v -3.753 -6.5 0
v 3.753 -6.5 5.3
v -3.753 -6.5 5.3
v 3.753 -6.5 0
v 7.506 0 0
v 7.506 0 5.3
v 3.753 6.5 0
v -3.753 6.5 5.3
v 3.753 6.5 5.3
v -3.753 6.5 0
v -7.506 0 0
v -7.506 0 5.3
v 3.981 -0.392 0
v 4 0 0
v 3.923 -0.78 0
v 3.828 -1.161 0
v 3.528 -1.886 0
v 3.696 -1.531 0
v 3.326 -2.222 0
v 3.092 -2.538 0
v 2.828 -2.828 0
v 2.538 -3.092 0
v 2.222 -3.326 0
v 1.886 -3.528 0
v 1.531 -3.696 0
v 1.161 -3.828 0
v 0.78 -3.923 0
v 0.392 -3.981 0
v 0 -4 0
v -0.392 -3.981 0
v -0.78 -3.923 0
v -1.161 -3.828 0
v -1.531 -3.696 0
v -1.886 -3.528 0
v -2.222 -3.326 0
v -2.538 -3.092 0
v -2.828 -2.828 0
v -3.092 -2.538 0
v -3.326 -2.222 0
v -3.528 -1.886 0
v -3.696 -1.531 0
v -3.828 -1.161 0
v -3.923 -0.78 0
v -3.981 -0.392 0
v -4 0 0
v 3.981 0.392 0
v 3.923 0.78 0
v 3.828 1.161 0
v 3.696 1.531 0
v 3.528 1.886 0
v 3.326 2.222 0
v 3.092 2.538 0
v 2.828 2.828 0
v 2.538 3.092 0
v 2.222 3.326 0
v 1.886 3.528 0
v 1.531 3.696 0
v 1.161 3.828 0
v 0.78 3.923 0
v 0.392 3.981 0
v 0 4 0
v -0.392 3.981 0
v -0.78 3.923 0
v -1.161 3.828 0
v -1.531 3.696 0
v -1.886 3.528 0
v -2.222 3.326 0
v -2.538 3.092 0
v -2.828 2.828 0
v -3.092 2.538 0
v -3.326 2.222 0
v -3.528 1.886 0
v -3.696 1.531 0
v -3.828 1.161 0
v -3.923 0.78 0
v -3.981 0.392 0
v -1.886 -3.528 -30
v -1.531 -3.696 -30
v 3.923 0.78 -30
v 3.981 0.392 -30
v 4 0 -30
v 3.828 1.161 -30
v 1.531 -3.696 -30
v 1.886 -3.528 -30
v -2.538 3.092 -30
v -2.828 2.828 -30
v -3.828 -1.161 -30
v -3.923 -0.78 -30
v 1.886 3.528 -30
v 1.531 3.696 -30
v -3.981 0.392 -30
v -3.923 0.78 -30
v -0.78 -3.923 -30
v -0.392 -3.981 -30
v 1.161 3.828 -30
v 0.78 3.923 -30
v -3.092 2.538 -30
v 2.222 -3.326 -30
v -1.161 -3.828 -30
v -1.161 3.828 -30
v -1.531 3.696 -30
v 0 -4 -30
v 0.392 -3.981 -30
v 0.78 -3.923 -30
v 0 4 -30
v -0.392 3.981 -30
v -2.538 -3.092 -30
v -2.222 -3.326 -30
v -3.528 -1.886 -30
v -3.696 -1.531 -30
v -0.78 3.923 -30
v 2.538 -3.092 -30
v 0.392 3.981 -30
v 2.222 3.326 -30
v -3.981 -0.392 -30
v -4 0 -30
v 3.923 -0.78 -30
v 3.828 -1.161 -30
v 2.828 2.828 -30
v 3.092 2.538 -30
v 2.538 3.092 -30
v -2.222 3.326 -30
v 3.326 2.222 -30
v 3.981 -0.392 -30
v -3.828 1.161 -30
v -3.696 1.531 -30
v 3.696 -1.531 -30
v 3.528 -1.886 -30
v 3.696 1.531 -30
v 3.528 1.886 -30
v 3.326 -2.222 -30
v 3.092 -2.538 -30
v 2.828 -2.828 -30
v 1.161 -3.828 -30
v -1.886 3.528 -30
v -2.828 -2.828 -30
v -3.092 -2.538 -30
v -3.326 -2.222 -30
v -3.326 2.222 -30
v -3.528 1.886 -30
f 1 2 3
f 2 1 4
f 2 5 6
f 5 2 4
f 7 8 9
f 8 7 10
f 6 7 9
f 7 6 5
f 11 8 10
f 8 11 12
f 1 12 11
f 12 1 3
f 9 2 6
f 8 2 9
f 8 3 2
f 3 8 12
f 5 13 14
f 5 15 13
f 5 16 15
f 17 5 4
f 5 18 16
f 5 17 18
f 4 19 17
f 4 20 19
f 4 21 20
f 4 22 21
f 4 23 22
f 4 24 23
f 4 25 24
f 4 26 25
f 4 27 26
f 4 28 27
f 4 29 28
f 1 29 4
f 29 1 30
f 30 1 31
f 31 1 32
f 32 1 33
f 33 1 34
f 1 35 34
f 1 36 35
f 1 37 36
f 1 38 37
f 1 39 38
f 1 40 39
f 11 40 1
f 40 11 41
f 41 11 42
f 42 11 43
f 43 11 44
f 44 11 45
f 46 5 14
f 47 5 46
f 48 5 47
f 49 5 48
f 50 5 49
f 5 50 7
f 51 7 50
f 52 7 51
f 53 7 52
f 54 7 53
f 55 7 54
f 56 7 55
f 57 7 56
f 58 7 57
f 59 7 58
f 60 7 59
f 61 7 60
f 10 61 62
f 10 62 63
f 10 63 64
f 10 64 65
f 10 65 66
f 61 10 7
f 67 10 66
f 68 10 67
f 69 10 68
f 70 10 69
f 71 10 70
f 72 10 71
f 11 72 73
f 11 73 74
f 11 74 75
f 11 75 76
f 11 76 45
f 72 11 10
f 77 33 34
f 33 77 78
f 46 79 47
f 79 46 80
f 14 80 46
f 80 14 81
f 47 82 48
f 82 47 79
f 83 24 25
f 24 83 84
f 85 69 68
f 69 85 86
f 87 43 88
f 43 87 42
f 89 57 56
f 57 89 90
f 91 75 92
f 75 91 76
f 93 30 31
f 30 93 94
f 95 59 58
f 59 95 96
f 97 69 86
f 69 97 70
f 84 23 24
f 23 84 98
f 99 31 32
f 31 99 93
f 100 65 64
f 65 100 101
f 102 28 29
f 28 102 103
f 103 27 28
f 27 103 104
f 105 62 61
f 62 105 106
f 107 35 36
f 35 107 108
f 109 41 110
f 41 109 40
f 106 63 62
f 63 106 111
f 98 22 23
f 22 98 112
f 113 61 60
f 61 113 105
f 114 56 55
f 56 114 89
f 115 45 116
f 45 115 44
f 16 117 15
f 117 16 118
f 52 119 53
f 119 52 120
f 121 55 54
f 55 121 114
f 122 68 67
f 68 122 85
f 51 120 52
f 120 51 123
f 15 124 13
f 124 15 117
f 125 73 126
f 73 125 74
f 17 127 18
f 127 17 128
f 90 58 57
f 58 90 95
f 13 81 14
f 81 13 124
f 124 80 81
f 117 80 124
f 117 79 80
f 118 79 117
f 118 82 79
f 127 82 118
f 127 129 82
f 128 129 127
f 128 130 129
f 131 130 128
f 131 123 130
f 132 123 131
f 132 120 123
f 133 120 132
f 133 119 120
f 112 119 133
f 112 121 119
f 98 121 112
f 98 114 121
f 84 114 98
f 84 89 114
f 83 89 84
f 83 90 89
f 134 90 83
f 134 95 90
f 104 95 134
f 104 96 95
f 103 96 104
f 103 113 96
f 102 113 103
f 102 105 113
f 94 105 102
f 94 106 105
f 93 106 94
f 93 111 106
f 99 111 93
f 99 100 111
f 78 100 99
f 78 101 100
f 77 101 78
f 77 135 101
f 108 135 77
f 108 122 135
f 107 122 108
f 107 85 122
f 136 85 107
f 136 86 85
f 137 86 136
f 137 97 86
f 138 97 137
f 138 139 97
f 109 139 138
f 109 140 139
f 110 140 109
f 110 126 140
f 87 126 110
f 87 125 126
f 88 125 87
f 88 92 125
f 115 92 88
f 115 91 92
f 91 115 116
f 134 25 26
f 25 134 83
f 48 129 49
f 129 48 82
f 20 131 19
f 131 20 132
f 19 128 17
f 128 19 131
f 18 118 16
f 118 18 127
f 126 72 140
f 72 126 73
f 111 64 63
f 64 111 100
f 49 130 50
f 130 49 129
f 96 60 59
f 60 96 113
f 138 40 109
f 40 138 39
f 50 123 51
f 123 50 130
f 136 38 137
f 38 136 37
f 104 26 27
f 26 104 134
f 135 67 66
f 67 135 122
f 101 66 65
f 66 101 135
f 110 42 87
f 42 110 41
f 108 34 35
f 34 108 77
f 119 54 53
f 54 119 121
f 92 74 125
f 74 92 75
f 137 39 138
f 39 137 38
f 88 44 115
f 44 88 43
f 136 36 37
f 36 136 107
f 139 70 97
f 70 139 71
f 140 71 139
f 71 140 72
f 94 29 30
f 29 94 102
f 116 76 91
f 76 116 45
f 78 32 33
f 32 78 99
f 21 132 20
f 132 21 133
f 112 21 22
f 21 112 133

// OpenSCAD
// M8 六角ボルト(ねじ山省略)
// 頭部: 対辺距離 13mm, 高さ 5.3mm
// シャンク: 直径 8mm, 長さ 30mm

af = 13;          // 対辺距離 (across-flats)
head_h = 5.3;     // 頭部高さ
shank_d = 8;      // シャンク直径
shank_l = 30;     // シャンク長さ

// 六角形の外接円半径 = (対辺距離/2) / cos(30°)
hex_r = (af / 2) / cos(30);

union() {
    // 頭部(底面が z=0)
    cylinder(h = head_h, r = hex_r, $fn = 6);

    // シャンク(z=0 から z=-30 へ)
    translate([0, 0, -shank_l])
        cylinder(h = shank_l, d = shank_d, $fn = 64);
}
